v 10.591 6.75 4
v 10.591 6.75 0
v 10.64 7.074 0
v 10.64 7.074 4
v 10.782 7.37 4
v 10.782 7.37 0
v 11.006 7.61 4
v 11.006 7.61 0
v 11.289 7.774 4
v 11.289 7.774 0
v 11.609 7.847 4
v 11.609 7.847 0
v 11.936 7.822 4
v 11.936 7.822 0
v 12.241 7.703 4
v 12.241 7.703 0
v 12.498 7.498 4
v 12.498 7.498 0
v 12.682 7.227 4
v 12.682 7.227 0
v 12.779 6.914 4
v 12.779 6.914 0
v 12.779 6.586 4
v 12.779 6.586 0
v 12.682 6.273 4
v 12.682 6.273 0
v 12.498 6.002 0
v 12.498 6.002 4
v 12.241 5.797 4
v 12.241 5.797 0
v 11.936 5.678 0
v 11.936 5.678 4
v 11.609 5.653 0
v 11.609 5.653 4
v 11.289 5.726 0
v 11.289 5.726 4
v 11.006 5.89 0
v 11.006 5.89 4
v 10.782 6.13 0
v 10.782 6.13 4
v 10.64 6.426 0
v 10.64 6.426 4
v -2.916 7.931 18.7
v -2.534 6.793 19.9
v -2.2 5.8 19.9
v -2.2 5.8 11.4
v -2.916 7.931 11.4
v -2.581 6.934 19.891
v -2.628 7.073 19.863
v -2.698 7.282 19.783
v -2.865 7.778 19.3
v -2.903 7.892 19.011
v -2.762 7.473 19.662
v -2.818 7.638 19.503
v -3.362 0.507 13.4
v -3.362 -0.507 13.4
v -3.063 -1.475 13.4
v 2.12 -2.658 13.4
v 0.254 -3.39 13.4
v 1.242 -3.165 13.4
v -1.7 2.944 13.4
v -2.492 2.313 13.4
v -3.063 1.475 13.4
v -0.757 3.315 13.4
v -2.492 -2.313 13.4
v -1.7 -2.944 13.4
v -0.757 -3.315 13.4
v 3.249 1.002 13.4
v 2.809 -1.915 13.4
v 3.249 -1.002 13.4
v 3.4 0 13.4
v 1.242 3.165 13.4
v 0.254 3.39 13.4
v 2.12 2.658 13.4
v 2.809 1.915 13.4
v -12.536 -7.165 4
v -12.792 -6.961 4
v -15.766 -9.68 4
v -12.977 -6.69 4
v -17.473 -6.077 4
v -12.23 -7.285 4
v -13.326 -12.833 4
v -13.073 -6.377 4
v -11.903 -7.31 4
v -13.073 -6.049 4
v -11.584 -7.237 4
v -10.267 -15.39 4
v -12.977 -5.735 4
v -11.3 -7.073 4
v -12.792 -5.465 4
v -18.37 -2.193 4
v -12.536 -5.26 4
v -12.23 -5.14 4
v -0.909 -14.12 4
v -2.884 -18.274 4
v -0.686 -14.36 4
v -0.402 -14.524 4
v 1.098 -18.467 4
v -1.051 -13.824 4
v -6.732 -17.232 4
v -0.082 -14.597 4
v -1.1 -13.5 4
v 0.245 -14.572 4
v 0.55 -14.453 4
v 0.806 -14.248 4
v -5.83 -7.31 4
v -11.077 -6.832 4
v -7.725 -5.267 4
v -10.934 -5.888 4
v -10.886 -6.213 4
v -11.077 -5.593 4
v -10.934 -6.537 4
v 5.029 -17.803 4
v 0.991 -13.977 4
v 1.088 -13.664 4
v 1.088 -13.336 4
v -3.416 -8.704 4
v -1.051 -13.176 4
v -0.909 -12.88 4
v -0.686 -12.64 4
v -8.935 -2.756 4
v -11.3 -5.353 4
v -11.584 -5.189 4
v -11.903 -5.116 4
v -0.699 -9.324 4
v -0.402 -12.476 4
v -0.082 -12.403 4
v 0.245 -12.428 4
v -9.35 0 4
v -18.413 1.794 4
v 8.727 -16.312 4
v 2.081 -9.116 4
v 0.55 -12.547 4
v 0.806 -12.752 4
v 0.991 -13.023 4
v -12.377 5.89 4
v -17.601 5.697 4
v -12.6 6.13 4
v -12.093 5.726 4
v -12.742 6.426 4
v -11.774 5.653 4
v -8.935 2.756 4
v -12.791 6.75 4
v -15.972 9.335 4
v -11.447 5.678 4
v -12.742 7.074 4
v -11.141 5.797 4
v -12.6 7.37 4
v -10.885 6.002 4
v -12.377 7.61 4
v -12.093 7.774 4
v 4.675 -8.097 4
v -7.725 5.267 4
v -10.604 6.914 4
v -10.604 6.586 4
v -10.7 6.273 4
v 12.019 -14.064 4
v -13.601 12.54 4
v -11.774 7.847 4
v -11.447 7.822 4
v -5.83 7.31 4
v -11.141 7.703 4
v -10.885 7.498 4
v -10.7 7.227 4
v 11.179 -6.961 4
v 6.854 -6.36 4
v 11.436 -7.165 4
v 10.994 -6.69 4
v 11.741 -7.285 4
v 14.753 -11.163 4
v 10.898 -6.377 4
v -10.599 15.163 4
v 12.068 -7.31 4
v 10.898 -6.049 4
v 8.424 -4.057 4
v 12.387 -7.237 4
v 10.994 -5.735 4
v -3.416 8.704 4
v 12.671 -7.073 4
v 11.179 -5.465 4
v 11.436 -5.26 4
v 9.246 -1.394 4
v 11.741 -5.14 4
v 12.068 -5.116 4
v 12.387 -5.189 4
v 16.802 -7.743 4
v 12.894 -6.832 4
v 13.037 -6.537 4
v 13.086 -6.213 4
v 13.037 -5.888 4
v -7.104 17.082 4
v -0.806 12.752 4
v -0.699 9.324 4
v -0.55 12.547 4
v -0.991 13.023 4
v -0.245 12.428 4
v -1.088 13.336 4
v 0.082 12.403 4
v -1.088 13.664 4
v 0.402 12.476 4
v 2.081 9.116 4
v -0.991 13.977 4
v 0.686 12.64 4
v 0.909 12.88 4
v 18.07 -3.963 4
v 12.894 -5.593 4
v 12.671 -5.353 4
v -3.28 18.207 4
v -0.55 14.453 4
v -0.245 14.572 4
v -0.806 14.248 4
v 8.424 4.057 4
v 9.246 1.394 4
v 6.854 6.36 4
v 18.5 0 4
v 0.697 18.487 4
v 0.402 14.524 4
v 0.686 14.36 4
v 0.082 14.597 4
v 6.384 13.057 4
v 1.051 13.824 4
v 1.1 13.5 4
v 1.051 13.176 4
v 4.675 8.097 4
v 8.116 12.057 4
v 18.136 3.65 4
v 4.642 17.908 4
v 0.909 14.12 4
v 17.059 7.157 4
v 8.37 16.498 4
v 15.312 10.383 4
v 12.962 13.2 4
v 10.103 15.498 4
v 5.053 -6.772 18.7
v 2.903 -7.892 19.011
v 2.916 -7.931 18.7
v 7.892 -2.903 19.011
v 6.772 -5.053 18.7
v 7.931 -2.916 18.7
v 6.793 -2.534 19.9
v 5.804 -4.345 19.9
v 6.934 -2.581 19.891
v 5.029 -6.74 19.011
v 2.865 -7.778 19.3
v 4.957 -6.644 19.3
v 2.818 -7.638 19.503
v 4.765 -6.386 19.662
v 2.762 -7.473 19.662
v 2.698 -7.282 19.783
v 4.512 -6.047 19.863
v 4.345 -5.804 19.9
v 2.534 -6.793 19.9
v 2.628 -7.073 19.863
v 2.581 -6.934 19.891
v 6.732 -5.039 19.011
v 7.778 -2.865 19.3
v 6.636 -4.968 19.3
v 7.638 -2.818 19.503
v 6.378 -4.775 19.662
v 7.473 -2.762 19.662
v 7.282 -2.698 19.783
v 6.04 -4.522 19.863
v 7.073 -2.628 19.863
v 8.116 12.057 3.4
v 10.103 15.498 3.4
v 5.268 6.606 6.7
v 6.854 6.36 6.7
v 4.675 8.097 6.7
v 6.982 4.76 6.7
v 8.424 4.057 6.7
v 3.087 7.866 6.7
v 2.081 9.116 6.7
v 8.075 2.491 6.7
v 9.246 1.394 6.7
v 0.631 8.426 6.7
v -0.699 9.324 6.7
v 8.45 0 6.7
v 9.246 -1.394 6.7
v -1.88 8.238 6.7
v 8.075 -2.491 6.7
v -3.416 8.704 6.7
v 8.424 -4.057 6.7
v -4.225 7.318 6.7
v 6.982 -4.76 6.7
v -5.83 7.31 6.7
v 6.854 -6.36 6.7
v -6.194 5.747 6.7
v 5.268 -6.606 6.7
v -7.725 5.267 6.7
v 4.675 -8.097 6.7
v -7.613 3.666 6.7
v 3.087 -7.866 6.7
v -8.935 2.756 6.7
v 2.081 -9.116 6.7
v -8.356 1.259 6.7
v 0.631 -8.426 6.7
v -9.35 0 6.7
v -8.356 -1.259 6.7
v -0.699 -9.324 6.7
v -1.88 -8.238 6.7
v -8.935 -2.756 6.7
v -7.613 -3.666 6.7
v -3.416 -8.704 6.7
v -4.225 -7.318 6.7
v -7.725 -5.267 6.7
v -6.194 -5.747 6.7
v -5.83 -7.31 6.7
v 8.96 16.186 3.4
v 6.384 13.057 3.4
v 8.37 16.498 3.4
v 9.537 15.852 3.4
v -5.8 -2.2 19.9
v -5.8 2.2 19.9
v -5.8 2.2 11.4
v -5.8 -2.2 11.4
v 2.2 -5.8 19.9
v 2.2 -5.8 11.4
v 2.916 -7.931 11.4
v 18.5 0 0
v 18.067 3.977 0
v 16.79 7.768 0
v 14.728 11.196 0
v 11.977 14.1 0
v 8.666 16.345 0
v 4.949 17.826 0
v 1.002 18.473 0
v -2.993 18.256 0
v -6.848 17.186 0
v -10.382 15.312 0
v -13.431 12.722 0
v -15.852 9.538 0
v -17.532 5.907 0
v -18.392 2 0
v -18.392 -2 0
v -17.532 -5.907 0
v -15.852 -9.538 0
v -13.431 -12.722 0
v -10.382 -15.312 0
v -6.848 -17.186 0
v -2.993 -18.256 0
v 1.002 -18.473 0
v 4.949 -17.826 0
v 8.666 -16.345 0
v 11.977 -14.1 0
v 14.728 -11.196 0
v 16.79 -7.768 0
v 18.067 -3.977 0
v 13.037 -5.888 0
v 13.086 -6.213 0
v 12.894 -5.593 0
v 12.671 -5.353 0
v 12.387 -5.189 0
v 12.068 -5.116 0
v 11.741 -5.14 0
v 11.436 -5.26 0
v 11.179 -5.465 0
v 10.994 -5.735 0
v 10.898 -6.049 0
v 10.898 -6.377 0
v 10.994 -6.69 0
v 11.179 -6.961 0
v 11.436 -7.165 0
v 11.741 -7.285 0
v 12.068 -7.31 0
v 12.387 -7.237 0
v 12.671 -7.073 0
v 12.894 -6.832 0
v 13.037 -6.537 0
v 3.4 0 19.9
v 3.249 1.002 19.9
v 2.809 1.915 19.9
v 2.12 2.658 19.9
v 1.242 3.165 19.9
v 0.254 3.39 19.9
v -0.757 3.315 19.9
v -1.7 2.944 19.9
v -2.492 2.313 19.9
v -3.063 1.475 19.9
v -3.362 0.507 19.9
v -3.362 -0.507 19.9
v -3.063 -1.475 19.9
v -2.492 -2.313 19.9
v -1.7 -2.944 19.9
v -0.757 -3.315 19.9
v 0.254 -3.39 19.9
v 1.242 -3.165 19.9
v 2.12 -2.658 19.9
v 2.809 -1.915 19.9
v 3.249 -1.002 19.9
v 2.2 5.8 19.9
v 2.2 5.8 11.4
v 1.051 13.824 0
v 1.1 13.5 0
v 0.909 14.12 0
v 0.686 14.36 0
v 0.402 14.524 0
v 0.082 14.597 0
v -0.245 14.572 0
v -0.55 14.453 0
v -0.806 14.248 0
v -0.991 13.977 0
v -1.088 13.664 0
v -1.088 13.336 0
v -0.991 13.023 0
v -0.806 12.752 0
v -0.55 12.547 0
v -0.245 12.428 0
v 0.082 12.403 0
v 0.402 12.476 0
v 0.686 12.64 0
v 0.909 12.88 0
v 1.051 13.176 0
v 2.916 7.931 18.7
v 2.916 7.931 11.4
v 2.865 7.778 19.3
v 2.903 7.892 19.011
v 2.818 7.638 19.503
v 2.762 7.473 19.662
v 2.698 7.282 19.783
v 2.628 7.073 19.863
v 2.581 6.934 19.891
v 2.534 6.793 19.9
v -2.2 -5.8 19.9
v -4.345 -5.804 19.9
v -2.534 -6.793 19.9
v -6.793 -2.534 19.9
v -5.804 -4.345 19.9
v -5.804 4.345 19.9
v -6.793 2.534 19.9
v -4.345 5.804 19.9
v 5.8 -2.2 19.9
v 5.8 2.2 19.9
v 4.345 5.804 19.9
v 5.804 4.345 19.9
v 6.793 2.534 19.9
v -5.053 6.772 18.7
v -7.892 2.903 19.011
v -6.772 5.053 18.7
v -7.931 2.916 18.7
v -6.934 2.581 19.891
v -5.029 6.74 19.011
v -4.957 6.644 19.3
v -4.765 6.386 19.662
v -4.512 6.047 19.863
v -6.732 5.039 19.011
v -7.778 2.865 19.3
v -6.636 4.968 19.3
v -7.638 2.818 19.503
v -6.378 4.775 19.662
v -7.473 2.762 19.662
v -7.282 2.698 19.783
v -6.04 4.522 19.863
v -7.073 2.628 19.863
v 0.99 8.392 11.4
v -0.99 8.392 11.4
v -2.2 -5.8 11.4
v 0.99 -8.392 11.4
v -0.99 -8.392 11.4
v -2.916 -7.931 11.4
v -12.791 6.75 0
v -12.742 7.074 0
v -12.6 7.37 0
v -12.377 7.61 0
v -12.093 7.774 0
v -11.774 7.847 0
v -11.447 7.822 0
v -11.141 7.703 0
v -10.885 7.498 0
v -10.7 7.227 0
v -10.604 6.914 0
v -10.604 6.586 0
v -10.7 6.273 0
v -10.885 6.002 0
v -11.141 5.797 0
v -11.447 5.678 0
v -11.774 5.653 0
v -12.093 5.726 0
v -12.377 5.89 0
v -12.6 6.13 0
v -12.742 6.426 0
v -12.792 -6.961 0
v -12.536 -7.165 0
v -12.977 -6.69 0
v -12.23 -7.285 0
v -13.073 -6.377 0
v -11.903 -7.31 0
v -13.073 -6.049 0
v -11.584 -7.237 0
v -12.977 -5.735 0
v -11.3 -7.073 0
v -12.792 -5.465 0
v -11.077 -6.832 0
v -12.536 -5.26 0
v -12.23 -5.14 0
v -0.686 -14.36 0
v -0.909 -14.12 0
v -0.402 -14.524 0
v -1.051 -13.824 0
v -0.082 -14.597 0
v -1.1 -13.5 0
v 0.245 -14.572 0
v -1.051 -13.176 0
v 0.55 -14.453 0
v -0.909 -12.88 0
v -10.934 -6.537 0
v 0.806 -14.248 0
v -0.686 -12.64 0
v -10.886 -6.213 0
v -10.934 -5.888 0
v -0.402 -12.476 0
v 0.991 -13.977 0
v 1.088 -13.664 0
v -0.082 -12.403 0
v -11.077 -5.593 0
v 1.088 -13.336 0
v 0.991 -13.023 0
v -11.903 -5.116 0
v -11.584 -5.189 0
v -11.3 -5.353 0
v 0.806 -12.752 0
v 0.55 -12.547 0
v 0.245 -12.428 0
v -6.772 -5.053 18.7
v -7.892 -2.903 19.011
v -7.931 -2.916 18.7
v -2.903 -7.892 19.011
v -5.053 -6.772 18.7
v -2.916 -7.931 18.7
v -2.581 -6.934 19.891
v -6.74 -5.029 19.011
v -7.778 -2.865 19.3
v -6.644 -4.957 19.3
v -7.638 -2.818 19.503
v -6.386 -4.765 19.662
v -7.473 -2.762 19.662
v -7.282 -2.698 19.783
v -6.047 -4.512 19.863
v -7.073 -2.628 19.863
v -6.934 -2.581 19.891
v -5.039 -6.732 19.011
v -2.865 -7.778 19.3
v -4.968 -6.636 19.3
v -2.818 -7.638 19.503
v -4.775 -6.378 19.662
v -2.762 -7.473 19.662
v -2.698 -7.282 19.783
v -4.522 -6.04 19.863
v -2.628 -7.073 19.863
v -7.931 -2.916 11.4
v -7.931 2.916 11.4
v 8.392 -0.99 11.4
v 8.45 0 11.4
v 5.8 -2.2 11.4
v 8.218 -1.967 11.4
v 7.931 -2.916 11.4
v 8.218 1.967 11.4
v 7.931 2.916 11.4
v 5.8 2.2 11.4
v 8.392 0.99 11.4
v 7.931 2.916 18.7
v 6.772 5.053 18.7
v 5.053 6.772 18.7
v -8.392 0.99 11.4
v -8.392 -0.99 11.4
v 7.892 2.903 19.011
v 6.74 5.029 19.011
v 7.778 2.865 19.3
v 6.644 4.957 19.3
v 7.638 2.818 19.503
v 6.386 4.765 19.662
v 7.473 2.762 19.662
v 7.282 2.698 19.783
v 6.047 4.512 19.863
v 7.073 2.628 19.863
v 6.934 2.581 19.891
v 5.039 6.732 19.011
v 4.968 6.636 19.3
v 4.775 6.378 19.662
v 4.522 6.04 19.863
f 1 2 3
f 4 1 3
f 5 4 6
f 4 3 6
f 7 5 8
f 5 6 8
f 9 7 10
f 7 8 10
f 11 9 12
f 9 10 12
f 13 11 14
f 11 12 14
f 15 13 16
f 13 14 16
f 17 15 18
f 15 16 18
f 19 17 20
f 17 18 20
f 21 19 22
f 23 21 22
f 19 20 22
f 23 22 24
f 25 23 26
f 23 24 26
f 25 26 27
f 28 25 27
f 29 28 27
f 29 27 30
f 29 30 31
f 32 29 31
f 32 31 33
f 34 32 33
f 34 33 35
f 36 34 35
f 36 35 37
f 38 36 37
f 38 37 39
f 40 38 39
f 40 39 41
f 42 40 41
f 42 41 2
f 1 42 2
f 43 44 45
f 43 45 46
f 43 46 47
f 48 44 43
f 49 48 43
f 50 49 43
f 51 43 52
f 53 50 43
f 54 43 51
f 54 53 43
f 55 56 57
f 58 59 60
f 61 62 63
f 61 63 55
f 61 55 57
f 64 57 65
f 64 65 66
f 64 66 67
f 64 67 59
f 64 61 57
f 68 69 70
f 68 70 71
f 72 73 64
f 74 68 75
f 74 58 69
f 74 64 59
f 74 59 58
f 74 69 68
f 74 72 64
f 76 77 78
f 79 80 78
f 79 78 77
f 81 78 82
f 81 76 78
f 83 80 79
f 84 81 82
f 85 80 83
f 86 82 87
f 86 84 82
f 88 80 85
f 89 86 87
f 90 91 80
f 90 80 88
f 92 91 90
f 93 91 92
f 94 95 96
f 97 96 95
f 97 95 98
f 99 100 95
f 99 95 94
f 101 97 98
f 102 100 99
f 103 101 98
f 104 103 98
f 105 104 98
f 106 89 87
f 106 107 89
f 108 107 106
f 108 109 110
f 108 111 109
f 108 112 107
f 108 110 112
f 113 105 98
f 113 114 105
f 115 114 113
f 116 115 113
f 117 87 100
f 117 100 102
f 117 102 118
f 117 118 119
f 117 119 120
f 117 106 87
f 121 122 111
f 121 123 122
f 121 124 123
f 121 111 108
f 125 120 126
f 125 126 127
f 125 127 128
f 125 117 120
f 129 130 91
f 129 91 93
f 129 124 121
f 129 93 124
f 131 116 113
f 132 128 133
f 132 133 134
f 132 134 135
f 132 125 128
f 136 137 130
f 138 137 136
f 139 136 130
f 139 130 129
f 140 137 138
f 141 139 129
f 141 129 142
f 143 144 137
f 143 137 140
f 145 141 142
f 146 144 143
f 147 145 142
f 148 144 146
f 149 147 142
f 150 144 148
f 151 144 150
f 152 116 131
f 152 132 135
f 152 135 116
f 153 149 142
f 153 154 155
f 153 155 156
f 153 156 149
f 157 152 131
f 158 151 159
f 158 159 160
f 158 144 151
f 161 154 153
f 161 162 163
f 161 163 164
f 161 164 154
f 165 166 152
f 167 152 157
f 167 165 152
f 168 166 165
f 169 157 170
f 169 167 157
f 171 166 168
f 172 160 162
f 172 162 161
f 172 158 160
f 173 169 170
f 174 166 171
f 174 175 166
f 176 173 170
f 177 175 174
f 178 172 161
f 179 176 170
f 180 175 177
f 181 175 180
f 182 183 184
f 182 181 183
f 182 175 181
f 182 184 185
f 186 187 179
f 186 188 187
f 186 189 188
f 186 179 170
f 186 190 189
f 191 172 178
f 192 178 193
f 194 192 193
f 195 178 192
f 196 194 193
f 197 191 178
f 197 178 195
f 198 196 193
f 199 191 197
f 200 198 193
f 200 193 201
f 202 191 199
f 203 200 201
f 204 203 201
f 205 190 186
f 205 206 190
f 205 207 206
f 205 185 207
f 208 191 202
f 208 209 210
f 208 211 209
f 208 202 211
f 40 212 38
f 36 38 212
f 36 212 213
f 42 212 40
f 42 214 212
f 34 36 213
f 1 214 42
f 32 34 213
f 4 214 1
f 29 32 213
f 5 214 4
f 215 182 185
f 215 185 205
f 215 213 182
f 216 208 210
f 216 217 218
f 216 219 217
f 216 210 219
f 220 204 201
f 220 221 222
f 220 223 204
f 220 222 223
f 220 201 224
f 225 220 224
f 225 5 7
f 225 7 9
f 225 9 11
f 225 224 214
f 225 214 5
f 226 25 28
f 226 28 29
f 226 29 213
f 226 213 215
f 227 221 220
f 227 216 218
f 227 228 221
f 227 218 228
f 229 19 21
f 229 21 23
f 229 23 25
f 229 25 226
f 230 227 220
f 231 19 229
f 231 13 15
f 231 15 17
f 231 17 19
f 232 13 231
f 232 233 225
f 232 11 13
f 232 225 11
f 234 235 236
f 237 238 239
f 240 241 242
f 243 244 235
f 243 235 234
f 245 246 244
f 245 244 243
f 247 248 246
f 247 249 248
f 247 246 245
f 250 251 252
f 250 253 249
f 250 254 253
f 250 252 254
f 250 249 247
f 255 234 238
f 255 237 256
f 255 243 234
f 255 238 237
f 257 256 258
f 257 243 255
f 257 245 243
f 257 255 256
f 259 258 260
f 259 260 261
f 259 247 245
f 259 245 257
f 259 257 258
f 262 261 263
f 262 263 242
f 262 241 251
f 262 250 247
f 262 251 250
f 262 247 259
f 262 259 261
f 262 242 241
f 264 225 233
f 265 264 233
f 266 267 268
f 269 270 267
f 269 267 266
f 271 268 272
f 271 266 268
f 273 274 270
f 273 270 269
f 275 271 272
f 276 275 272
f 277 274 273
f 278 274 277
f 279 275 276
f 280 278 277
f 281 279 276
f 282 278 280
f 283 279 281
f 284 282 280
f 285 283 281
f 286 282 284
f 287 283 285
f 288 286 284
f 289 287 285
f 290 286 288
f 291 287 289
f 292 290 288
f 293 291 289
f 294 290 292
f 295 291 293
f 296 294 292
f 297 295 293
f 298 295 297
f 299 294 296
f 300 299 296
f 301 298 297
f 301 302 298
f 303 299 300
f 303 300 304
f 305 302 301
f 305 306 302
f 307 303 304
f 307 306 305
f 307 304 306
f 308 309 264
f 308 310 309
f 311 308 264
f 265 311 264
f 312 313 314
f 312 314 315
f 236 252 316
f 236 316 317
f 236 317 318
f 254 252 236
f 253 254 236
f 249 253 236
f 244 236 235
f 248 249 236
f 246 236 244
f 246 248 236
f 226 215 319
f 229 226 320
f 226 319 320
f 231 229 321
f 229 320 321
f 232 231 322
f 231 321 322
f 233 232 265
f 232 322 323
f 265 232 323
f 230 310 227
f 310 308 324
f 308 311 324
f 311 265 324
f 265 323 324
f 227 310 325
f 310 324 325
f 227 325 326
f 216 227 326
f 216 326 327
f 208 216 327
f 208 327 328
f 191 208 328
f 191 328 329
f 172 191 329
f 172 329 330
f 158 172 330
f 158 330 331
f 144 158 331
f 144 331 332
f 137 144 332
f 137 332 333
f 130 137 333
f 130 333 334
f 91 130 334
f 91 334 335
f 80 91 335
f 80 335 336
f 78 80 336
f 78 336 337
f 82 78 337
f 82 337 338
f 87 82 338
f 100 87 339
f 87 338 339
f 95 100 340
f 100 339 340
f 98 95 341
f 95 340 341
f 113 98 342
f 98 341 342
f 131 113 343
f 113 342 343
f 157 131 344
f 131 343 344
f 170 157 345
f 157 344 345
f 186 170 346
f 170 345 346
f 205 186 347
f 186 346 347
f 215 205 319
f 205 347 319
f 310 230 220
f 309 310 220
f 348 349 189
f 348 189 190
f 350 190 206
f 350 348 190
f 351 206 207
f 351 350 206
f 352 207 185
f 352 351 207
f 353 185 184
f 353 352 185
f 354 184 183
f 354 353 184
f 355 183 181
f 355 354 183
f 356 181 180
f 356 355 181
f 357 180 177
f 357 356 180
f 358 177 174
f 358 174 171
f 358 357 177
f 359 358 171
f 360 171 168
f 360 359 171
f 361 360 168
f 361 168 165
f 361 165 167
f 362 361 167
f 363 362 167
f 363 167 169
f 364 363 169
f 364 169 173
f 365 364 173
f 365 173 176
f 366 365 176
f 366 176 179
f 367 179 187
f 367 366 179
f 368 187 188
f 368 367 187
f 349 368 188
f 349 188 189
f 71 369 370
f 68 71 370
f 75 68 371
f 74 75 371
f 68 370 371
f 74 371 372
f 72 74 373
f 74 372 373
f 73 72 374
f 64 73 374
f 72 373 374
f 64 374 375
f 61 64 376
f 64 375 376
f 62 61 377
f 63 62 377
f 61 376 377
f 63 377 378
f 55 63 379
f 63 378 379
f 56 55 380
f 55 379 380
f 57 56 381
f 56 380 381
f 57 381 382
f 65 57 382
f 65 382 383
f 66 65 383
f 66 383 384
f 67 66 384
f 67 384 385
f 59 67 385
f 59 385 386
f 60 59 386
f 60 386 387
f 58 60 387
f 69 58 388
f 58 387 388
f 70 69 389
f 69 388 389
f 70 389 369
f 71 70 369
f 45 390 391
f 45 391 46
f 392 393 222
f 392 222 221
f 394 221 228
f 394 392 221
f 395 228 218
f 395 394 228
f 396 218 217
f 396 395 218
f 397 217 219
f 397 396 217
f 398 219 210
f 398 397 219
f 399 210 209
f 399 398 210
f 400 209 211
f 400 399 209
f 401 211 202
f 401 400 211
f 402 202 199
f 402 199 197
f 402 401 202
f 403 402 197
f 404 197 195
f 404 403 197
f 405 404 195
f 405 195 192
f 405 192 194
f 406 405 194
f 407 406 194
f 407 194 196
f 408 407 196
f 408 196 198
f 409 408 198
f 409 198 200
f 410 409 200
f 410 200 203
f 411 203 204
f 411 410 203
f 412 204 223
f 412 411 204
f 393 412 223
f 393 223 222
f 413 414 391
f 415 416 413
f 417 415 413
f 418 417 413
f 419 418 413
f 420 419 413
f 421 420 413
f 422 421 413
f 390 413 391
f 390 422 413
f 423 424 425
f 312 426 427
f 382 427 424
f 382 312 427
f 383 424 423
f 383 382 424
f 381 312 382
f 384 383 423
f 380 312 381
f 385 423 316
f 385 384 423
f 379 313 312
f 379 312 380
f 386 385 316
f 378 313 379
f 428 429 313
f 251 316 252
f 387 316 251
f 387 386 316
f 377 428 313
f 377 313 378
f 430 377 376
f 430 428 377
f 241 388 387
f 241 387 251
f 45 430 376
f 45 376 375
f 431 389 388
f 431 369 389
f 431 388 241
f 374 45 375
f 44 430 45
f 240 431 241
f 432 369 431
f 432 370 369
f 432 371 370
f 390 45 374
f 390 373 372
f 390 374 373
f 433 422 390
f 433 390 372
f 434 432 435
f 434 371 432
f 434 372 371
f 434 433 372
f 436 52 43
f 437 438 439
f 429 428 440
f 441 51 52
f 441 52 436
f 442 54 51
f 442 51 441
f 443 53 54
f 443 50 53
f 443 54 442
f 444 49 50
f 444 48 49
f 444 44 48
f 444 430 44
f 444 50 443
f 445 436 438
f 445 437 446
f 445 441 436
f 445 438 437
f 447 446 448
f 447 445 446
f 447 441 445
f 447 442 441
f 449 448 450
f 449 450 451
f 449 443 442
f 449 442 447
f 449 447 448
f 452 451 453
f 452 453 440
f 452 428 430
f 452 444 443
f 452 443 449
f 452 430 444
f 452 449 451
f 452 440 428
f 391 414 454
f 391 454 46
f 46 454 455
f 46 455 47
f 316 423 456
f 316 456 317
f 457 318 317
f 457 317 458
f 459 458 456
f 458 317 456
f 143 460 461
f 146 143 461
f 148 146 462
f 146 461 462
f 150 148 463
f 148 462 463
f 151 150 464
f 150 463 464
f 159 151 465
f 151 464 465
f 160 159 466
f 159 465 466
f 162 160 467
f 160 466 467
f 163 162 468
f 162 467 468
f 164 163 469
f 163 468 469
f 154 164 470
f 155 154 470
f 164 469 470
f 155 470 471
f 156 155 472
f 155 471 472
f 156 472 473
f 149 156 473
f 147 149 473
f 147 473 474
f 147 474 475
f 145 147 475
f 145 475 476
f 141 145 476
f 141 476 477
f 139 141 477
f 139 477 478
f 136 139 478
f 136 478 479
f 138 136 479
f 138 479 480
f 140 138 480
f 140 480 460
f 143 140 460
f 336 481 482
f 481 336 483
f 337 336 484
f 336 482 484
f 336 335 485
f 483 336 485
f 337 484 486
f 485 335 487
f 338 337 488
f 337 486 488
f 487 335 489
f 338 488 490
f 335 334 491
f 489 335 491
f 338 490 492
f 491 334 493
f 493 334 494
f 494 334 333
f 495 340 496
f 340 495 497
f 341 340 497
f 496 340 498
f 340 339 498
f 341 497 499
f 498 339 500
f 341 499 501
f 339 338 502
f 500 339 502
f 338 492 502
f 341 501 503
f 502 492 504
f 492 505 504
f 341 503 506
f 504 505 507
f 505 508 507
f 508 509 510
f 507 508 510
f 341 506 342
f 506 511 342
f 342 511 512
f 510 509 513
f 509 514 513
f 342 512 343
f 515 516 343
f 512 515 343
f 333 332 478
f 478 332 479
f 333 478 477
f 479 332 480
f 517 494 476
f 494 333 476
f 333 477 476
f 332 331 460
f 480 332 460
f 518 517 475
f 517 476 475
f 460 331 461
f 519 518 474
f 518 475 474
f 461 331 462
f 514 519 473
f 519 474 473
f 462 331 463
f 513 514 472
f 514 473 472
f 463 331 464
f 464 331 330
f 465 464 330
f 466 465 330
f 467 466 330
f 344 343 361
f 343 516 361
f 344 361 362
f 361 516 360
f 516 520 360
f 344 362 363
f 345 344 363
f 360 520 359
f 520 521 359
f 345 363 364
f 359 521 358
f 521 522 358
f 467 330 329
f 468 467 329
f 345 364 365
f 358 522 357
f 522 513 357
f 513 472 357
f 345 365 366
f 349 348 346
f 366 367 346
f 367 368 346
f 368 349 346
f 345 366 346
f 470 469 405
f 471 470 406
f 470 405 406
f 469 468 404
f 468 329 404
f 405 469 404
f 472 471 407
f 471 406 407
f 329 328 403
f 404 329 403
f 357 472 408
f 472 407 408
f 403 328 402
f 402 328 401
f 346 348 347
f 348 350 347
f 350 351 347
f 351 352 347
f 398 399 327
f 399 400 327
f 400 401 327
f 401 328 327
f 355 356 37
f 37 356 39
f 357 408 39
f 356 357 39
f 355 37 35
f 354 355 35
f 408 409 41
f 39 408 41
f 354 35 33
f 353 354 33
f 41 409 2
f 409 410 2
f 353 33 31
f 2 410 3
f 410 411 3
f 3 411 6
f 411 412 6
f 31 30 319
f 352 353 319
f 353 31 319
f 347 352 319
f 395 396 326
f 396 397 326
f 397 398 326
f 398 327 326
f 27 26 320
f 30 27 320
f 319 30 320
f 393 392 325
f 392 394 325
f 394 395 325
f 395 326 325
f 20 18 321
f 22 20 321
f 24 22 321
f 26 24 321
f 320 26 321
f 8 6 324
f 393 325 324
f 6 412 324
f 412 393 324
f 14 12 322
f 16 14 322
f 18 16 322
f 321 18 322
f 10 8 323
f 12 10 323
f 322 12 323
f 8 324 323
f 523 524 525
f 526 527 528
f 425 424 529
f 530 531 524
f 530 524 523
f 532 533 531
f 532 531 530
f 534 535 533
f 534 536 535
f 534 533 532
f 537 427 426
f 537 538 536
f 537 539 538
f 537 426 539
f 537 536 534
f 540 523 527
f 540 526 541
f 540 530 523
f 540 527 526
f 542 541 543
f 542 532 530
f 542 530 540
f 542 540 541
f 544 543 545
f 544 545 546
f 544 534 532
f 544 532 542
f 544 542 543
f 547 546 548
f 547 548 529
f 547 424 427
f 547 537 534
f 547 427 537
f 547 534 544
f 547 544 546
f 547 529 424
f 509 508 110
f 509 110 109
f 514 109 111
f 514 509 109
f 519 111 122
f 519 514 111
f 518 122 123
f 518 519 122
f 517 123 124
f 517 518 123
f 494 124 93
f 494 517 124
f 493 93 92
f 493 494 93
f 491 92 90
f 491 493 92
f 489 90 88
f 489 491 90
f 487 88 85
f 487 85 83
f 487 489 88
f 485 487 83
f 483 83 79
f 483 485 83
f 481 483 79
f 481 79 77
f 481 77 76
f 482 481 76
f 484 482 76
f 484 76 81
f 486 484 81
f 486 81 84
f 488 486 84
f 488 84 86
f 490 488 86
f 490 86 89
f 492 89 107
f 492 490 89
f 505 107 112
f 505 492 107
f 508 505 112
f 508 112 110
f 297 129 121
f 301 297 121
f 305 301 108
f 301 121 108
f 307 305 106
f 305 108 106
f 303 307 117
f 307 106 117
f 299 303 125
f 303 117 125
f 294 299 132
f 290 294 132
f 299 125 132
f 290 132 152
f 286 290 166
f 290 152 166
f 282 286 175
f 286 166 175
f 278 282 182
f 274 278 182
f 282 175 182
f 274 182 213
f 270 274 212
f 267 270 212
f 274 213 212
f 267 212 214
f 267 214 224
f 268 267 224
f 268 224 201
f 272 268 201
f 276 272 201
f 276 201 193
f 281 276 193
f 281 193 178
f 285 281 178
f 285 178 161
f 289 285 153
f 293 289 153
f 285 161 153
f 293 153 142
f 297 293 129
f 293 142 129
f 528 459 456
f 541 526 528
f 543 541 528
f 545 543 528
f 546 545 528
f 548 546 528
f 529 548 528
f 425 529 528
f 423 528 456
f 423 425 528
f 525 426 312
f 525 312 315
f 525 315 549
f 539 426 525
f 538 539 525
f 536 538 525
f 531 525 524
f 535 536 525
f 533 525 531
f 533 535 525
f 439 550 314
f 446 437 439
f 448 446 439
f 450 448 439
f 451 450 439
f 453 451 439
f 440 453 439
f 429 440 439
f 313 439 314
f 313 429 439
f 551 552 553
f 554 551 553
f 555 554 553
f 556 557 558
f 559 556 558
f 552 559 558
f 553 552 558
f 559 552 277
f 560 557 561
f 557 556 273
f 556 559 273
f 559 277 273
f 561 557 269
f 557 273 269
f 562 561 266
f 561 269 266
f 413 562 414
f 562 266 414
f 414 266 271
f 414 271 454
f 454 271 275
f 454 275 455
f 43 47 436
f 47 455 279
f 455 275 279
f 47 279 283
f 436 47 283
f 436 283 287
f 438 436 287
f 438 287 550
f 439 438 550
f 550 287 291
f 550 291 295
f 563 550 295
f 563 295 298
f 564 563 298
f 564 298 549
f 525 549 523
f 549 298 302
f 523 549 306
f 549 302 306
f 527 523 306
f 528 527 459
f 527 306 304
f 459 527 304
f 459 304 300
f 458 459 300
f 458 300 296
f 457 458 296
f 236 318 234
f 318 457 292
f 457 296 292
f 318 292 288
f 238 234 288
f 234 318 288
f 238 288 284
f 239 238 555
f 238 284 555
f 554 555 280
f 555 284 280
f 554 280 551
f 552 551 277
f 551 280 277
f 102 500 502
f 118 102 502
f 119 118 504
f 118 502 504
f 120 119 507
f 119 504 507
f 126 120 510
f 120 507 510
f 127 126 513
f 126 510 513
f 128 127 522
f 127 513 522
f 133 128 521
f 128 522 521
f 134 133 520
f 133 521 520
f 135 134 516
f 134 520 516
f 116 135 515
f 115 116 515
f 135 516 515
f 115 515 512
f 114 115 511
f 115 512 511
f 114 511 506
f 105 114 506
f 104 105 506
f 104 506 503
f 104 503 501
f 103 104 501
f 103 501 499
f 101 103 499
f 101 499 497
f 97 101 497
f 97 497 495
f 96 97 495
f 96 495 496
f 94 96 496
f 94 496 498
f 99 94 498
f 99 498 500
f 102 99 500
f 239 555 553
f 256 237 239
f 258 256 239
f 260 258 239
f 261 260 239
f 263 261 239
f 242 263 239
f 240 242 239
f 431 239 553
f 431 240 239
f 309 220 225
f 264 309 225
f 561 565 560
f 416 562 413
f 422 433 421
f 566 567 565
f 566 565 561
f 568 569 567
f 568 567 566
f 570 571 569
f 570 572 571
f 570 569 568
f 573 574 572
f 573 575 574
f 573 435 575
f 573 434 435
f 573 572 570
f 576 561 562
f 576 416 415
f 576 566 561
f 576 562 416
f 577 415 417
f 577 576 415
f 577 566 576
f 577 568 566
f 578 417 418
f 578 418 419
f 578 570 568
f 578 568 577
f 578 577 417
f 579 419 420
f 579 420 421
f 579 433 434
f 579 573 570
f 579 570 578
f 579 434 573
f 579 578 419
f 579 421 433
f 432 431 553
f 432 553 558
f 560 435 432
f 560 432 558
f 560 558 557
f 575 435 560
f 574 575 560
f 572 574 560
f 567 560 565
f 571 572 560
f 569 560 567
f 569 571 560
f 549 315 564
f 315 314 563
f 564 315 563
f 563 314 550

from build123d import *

# Parameters (mm, degrees)
SKETCH_1_R          = 18.5
SKETCH_1_R_2        = 1.1
EXTRUDE_1_DEPTH     = 4
SKETCH_3_R          = 8.45
EXTRUDE_3_DEPTH     = 15.9
FILLET_1_R          = 1.2
CUT_EXTRUDE_1_DEPTH = 8.5
SKETCH_5_R          = 9.35
EXTRUDE_4_DEPTH     = 2.7
SKETCH_6_R          = 1.1
CUT_EXTRUDE_2_DEPTH = 33.871111998
SKETCH_7_R          = 3.4
CUT_EXTRUDE_3_DEPTH = 6.5
CUT_EXTRUDE_START   = 4
CUT_EXTRUDE_5_DEPTH = 0.6


with BuildPart() as part:
    # Эскиз1 → Бобышка-Вытянуть1 (new body)
    with BuildSketch(Plane.XY):
        Circle(SKETCH_1_R)
        with Locations((0, 13.5)):
            Circle(SKETCH_1_R_2, mode=Mode.SUBTRACT)
        with Locations((-11.985507699, -6.212697095)):
            Circle(SKETCH_1_R_2, mode=Mode.SUBTRACT)
        with Locations((11.985507699, -6.212697095)):
            Circle(SKETCH_1_R_2, mode=Mode.SUBTRACT)
    extrude(amount=EXTRUDE_1_DEPTH)

    # Эскиз3 → Бобышка-Вытянуть3 (add)
    with BuildSketch(Plane.XY.offset(4)):
        Circle(SKETCH_3_R)
    extrude(amount=EXTRUDE_3_DEPTH)

    # Скругление1
    fillet_1_edges = [part.edges().sort_by_distance(p)[0] for p in [
        (-8.45, 0, 19.9),
    ]]
    fillet(fillet_1_edges, radius=FILLET_1_R)

    # Эскиз4 → Вырез-Вытянуть1 (cut)
    with BuildSketch(Plane.XY.offset(19.9)):
        with BuildLine():
            Line((-2.2, 5.799999981), (-2.931860794, 7.978357743))
            ThreePointArc((-2.931860794, 7.978357743), (-6.37e-07, 8.5), (2.931859599, 7.978358183))
            Line((2.931859599, 7.978358183), (2.2, 5.800000019))
            Line((2.2, 5.800000019), (-2.2, 5.799999981))
        make_face()
        with BuildLine():
            Line((5.799999981, 2.2), (7.978357743, 2.931860794))
            ThreePointArc((7.978357743, 2.931860794), (8.5, 6.37e-07), (7.978358183, -2.931859599))
            Line((7.978358183, -2.931859599), (5.800000019, -2.2))
            Line((5.800000019, -2.2), (5.799999981, 2.2))
        make_face()
        with BuildLine():
            Line((2.2, -5.799999981), (2.931860794, -7.978357743))
            ThreePointArc((2.931860794, -7.978357743), (6.37e-07, -8.5), (-2.931859599, -7.978358183))
            Line((-2.931859599, -7.978358183), (-2.2, -5.800000019))
            Line((-2.2, -5.800000019), (2.2, -5.799999981))
        make_face()
        with BuildLine():
            Line((-5.799999981, -2.2), (-7.978357743, -2.931860794))
            ThreePointArc((-7.978357743, -2.931860794), (-8.5, -6.37e-07), (-7.978358183, 2.931859599))
            Line((-7.978358183, 2.931859599), (-5.800000019, 2.2))
            Line((-5.800000019, 2.2), (-5.799999981, -2.2))
        make_face()
    extrude(amount=-CUT_EXTRUDE_1_DEPTH, mode=Mode.SUBTRACT)

    # Эскиз5 → Бобышка-Вытянуть4 (add)
    with BuildSketch(Plane.XY.offset(4)):
        with Locations(Location((0, 0, 0), (0, 0, 180))):
            Circle(SKETCH_5_R)
    extrude(amount=EXTRUDE_4_DEPTH)

    # Эскиз6 → Вырез-Вытянуть2 (cut, through all)
    with BuildSketch(Plane(origin=(0, 0, 0), x_dir=(-1, 0, 0), z_dir=(0, 0, -1))):
        with Locations((-11.691342951, 6.75)):
            Circle(SKETCH_6_R)
        with Locations((11.691342951, 6.75)):
            Circle(SKETCH_6_R)
        with Locations((0, -13.5)):
            Circle(SKETCH_6_R)
    extrude(amount=-CUT_EXTRUDE_2_DEPTH, mode=Mode.SUBTRACT)

    # Эскиз7 → Вырез-Вытянуть3 (cut)
    with BuildSketch(Plane.XY.offset(19.9)):
        Circle(SKETCH_7_R)
    extrude(amount=-CUT_EXTRUDE_3_DEPTH, mode=Mode.SUBTRACT)

    # Эскиз8 → Вырез-Вытянуть5 (cut)
    with BuildSketch(Plane.XY.offset(CUT_EXTRUDE_START)):
        Polygon((8.116025404, 12.057368355), (10.116025404, 15.52146997), (8.383974596, 16.52146997), (6.383974596, 13.057368355), align=None)
    extrude(amount=-CUT_EXTRUDE_5_DEPTH, mode=Mode.SUBTRACT)


solid = part.part
